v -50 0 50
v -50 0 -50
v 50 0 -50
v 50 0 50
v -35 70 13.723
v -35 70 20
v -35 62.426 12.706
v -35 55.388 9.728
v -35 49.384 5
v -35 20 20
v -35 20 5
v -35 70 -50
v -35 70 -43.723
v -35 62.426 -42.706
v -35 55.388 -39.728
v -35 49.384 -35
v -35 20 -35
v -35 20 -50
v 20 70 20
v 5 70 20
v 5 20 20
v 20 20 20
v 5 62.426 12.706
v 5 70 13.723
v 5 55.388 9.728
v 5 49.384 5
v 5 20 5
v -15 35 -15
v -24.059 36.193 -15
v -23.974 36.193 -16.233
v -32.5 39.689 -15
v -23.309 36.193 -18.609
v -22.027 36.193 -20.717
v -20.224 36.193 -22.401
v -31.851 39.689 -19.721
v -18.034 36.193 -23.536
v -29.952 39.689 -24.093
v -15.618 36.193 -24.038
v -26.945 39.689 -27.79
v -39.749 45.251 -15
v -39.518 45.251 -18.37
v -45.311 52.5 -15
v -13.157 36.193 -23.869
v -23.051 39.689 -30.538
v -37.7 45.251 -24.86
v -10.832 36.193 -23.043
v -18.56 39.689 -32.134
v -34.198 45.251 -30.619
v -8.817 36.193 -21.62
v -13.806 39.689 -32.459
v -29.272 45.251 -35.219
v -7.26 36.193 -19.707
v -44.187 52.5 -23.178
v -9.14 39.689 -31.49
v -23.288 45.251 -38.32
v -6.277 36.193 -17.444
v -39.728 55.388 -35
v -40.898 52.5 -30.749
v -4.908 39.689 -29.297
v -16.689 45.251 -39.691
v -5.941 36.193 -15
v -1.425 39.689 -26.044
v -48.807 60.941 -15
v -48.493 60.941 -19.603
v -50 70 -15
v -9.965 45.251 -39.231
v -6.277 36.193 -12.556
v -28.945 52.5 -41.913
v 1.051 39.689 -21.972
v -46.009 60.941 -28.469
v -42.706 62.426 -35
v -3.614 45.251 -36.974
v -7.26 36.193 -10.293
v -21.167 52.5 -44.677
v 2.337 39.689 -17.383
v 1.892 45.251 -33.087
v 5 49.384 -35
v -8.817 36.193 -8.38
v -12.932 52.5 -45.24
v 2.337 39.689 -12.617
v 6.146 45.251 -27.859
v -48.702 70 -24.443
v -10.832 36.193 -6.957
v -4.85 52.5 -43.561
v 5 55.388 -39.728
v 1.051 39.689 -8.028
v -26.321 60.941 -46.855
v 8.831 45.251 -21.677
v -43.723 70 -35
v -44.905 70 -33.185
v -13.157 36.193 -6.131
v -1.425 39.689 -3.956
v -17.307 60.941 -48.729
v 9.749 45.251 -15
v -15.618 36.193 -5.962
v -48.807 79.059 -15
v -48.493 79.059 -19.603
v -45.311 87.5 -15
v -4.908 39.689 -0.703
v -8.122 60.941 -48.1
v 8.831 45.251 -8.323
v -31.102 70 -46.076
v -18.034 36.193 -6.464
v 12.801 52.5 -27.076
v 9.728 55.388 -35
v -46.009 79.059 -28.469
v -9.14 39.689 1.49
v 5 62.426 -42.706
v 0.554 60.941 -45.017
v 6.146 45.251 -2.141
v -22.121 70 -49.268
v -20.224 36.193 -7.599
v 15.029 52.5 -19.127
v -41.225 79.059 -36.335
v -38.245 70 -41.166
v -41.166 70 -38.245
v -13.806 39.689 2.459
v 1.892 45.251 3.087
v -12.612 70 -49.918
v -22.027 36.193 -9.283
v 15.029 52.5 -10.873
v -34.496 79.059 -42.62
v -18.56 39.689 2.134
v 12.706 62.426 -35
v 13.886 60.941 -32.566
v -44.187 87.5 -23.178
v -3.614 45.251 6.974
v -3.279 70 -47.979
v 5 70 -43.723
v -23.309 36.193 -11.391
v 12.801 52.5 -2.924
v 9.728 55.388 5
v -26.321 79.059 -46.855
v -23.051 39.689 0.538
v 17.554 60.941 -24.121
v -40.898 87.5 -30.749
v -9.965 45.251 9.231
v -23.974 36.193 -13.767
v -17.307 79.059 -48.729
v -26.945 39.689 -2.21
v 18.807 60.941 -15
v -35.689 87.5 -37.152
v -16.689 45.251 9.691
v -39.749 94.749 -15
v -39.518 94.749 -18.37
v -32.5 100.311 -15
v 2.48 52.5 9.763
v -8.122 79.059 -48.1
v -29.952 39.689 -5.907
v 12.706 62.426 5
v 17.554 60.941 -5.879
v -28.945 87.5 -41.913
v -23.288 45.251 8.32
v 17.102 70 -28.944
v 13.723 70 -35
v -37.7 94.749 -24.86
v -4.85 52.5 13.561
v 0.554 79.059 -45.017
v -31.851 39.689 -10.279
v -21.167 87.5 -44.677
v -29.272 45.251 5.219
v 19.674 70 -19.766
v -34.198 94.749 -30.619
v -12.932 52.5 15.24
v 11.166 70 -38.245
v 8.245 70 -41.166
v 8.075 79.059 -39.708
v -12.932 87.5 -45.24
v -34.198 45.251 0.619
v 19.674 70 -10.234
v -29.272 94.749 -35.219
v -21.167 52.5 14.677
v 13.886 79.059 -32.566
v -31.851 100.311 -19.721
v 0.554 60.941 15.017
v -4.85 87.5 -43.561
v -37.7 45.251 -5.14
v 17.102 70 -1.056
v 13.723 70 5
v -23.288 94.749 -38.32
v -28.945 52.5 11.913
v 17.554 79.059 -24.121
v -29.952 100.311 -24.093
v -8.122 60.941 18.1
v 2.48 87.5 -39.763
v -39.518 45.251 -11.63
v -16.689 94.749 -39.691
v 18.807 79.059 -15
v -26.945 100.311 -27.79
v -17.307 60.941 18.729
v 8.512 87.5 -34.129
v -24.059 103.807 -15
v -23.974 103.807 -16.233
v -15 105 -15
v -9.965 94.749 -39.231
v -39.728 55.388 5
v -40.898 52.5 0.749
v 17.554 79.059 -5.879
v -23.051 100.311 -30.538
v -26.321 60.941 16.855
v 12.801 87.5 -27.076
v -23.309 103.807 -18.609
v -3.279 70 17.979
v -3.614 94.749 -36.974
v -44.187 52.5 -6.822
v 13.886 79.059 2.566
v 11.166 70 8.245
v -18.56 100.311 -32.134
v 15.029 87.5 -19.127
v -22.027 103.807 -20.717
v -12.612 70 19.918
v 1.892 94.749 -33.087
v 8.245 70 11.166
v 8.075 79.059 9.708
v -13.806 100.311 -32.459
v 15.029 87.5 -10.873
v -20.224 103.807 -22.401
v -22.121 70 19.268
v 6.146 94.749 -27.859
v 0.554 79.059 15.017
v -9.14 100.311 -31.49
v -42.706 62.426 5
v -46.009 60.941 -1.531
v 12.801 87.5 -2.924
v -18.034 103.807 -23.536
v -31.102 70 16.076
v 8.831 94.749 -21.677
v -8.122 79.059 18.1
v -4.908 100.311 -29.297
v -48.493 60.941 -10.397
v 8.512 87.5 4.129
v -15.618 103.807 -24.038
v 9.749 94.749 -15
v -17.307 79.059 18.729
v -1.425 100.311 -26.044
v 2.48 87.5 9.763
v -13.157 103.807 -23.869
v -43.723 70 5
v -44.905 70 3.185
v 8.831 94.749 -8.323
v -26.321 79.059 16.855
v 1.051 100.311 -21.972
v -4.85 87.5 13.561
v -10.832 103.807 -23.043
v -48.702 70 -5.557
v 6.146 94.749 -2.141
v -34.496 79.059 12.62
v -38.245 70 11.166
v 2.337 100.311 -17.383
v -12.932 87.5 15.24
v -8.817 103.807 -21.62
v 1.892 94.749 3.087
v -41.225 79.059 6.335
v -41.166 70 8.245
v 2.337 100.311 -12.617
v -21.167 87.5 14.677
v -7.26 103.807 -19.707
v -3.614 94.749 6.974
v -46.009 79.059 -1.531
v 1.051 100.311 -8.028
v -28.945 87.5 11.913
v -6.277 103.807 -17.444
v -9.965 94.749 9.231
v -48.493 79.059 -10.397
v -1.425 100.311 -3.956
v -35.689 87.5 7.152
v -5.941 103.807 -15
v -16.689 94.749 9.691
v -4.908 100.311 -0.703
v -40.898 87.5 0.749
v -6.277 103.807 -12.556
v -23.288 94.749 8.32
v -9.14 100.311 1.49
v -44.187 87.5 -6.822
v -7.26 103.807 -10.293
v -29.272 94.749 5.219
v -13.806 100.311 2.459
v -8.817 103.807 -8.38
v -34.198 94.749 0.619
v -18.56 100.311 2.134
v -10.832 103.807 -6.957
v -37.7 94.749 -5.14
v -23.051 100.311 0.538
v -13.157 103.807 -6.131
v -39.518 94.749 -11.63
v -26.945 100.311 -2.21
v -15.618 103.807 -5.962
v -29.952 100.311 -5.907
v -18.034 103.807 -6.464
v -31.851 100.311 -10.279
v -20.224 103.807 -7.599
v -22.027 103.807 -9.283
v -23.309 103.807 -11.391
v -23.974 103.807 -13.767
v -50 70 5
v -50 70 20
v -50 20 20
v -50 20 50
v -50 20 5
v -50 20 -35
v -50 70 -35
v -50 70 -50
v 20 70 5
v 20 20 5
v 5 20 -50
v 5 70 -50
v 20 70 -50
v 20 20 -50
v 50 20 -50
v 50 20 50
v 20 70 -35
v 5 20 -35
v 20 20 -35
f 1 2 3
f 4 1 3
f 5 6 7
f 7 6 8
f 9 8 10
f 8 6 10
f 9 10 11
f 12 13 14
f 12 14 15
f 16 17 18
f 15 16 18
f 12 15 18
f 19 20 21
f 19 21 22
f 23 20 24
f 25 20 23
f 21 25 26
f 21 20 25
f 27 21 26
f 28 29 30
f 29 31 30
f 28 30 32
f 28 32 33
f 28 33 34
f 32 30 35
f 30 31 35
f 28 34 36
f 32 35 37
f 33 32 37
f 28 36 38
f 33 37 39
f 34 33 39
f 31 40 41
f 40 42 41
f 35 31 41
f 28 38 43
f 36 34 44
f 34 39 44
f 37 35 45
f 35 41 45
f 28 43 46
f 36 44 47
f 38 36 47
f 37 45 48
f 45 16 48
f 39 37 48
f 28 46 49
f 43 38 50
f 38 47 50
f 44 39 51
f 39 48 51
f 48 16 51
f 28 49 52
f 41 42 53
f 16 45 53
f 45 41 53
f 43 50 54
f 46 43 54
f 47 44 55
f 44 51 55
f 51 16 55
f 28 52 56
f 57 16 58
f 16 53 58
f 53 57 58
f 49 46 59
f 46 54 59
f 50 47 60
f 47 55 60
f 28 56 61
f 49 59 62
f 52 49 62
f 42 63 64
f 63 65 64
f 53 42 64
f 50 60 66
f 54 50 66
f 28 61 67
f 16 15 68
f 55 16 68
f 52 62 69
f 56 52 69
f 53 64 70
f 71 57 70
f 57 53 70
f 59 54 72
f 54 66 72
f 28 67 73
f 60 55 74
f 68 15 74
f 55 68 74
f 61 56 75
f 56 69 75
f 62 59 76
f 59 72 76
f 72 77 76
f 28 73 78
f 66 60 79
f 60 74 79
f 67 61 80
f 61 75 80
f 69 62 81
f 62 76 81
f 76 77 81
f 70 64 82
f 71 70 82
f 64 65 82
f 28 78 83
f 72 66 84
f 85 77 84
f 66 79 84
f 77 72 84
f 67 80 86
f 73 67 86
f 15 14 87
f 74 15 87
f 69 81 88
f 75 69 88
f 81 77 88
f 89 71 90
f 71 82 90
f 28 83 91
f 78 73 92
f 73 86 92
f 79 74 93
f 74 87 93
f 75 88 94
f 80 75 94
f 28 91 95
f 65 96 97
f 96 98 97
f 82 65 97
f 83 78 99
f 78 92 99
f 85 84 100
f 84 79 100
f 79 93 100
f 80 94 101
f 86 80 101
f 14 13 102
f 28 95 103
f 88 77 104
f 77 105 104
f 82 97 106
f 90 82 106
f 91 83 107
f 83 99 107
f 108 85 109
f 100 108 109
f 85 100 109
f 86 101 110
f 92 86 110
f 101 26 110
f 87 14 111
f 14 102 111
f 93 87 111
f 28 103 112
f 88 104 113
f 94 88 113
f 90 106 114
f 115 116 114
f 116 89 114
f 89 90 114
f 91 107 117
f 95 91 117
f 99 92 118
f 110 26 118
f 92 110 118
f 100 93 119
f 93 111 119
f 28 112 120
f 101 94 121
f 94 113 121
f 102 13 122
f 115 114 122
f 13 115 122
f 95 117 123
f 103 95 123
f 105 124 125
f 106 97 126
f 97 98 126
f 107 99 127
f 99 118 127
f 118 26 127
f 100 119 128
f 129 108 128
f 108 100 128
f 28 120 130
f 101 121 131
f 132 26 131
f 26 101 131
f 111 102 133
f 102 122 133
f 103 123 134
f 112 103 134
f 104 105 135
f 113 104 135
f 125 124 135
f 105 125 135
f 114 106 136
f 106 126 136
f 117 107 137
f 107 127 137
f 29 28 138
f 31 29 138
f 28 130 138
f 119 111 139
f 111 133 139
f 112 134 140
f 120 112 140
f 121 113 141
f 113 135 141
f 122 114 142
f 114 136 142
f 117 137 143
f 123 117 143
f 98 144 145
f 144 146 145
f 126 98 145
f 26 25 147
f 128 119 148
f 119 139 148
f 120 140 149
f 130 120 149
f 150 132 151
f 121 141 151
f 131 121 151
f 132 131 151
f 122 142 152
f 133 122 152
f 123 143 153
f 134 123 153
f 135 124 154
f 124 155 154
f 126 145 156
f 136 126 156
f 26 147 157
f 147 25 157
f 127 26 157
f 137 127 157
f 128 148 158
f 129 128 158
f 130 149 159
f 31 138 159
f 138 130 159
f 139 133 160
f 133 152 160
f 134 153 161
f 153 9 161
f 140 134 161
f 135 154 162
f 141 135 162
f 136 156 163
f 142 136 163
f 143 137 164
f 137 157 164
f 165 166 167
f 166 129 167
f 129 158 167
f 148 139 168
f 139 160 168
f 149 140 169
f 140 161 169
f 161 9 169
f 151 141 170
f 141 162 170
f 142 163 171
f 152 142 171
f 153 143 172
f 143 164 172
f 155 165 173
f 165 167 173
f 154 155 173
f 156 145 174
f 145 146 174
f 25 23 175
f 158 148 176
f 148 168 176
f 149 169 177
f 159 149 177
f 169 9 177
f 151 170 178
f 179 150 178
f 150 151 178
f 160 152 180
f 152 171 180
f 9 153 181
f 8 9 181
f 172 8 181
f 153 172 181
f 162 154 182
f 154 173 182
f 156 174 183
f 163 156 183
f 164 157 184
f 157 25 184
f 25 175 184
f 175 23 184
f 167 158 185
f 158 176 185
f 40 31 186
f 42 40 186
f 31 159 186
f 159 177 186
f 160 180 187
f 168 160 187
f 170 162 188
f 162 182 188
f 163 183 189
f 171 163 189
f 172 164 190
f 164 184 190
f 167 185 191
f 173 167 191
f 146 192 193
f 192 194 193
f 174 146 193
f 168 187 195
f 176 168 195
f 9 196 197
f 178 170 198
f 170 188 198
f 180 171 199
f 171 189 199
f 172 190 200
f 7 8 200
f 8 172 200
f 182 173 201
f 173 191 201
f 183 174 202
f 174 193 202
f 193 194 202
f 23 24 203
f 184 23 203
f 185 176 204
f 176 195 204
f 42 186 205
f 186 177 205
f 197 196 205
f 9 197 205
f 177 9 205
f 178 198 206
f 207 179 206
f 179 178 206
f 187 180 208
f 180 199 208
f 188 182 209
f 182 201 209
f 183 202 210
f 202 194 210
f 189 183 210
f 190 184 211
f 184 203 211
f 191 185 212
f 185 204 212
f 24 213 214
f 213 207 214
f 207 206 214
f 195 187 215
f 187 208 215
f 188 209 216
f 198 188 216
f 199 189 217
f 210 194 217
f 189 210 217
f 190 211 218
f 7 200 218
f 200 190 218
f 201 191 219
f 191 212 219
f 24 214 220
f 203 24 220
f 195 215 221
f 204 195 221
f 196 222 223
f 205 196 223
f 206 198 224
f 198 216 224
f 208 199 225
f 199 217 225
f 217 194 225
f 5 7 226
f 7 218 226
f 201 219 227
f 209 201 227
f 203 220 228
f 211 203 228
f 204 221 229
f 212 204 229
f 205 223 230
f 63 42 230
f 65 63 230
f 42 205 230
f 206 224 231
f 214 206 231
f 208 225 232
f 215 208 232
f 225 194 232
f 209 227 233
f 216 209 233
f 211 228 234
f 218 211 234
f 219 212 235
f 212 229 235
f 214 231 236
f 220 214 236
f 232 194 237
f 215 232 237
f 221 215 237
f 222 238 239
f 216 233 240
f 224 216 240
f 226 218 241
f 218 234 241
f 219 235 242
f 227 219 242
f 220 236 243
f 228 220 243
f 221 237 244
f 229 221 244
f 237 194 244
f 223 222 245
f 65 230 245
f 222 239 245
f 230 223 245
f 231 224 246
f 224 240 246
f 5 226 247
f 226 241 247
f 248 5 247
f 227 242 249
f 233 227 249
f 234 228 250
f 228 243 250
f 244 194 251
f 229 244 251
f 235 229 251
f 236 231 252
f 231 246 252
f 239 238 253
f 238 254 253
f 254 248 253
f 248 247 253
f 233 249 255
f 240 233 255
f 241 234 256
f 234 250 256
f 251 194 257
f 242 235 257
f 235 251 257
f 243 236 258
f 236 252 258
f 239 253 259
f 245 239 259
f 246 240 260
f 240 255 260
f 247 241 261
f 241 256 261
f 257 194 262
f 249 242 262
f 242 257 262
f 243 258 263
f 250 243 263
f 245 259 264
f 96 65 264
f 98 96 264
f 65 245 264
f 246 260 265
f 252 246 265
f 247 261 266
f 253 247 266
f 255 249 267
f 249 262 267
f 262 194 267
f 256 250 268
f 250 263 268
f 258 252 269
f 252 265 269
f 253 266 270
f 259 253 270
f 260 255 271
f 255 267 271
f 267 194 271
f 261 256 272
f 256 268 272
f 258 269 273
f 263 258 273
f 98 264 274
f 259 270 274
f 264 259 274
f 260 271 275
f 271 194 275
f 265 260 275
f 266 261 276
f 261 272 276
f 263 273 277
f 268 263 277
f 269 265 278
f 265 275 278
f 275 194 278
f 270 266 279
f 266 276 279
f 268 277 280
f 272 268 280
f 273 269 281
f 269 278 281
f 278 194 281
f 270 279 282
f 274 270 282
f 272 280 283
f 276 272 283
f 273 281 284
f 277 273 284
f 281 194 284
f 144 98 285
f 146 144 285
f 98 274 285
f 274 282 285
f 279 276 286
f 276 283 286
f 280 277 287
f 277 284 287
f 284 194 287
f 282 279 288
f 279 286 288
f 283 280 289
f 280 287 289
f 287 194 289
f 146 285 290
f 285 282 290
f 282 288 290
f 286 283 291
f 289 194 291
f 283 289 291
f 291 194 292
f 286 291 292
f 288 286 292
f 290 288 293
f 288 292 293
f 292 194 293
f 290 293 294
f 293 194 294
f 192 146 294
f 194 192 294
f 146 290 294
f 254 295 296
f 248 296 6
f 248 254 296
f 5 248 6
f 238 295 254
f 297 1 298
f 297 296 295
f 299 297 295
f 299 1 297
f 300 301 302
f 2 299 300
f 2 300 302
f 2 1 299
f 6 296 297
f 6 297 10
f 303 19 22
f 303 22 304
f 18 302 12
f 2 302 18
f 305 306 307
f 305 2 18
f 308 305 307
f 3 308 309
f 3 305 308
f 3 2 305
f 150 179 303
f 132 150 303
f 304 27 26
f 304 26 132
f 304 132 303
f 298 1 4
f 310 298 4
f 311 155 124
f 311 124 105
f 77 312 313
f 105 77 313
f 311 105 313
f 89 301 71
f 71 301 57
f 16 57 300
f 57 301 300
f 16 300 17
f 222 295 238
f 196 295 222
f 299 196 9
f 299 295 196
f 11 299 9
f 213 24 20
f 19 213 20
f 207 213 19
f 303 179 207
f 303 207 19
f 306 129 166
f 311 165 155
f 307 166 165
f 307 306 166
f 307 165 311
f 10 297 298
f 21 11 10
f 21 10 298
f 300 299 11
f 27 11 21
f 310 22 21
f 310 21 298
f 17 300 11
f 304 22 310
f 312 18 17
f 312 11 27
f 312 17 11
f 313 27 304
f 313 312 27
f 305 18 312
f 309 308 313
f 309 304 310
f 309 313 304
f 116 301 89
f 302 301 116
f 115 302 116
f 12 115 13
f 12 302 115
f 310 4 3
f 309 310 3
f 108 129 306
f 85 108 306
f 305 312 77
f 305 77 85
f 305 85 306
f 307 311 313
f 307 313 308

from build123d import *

# Parameters (mm, degrees)
CROQUIS1_W              = 100
CROQUIS1_H              = 100
SALIENTE_EXTRUIR1_DEPTH = 20
CROQUIS2_W              = 15
CROQUIS2_H              = 15
SALIENTE_EXTRUIR2_DEPTH = 50


with BuildPart() as part:
    # Croquis1 → Saliente-Extruir1 (new body)
    with BuildSketch(Plane(origin=(0, 0, 0), x_dir=(1, 0, 0), z_dir=(0, 1, 0))):
        Rectangle(CROQUIS1_W, CROQUIS1_H)
    extrude(amount=SALIENTE_EXTRUIR1_DEPTH)

    # Croquis2 → Saliente-Extruir2 (add)
    with BuildSketch(Plane(origin=(0, 20, 0), x_dir=(1, 0, 0), z_dir=(0, 1, 0))):
        with Locations((-42.5, -12.5)):
            Rectangle(CROQUIS2_W, CROQUIS2_H)
        with Locations((-42.5, 42.5)):
            Rectangle(CROQUIS2_W, CROQUIS2_H)
        with Locations((12.5, 42.5)):
            Rectangle(CROQUIS2_W, CROQUIS2_H)
        with Locations((12.5, -12.5)):
            Rectangle(CROQUIS2_W, CROQUIS2_H)
    extrude(amount=SALIENTE_EXTRUIR2_DEPTH)

    # Croquis4 → Revolución1 (revolve)
    with BuildSketch(Plane.XY.offset(-15)):
        with BuildLine():
            Line((-15, 105), (-15, 35))
            ThreePointArc((-15, 35), (-50, 70), (-15, 105))
        make_face()
    revolve(axis=Axis((-15, 105, -15), (0, -1, 0)))


solid = part.part
